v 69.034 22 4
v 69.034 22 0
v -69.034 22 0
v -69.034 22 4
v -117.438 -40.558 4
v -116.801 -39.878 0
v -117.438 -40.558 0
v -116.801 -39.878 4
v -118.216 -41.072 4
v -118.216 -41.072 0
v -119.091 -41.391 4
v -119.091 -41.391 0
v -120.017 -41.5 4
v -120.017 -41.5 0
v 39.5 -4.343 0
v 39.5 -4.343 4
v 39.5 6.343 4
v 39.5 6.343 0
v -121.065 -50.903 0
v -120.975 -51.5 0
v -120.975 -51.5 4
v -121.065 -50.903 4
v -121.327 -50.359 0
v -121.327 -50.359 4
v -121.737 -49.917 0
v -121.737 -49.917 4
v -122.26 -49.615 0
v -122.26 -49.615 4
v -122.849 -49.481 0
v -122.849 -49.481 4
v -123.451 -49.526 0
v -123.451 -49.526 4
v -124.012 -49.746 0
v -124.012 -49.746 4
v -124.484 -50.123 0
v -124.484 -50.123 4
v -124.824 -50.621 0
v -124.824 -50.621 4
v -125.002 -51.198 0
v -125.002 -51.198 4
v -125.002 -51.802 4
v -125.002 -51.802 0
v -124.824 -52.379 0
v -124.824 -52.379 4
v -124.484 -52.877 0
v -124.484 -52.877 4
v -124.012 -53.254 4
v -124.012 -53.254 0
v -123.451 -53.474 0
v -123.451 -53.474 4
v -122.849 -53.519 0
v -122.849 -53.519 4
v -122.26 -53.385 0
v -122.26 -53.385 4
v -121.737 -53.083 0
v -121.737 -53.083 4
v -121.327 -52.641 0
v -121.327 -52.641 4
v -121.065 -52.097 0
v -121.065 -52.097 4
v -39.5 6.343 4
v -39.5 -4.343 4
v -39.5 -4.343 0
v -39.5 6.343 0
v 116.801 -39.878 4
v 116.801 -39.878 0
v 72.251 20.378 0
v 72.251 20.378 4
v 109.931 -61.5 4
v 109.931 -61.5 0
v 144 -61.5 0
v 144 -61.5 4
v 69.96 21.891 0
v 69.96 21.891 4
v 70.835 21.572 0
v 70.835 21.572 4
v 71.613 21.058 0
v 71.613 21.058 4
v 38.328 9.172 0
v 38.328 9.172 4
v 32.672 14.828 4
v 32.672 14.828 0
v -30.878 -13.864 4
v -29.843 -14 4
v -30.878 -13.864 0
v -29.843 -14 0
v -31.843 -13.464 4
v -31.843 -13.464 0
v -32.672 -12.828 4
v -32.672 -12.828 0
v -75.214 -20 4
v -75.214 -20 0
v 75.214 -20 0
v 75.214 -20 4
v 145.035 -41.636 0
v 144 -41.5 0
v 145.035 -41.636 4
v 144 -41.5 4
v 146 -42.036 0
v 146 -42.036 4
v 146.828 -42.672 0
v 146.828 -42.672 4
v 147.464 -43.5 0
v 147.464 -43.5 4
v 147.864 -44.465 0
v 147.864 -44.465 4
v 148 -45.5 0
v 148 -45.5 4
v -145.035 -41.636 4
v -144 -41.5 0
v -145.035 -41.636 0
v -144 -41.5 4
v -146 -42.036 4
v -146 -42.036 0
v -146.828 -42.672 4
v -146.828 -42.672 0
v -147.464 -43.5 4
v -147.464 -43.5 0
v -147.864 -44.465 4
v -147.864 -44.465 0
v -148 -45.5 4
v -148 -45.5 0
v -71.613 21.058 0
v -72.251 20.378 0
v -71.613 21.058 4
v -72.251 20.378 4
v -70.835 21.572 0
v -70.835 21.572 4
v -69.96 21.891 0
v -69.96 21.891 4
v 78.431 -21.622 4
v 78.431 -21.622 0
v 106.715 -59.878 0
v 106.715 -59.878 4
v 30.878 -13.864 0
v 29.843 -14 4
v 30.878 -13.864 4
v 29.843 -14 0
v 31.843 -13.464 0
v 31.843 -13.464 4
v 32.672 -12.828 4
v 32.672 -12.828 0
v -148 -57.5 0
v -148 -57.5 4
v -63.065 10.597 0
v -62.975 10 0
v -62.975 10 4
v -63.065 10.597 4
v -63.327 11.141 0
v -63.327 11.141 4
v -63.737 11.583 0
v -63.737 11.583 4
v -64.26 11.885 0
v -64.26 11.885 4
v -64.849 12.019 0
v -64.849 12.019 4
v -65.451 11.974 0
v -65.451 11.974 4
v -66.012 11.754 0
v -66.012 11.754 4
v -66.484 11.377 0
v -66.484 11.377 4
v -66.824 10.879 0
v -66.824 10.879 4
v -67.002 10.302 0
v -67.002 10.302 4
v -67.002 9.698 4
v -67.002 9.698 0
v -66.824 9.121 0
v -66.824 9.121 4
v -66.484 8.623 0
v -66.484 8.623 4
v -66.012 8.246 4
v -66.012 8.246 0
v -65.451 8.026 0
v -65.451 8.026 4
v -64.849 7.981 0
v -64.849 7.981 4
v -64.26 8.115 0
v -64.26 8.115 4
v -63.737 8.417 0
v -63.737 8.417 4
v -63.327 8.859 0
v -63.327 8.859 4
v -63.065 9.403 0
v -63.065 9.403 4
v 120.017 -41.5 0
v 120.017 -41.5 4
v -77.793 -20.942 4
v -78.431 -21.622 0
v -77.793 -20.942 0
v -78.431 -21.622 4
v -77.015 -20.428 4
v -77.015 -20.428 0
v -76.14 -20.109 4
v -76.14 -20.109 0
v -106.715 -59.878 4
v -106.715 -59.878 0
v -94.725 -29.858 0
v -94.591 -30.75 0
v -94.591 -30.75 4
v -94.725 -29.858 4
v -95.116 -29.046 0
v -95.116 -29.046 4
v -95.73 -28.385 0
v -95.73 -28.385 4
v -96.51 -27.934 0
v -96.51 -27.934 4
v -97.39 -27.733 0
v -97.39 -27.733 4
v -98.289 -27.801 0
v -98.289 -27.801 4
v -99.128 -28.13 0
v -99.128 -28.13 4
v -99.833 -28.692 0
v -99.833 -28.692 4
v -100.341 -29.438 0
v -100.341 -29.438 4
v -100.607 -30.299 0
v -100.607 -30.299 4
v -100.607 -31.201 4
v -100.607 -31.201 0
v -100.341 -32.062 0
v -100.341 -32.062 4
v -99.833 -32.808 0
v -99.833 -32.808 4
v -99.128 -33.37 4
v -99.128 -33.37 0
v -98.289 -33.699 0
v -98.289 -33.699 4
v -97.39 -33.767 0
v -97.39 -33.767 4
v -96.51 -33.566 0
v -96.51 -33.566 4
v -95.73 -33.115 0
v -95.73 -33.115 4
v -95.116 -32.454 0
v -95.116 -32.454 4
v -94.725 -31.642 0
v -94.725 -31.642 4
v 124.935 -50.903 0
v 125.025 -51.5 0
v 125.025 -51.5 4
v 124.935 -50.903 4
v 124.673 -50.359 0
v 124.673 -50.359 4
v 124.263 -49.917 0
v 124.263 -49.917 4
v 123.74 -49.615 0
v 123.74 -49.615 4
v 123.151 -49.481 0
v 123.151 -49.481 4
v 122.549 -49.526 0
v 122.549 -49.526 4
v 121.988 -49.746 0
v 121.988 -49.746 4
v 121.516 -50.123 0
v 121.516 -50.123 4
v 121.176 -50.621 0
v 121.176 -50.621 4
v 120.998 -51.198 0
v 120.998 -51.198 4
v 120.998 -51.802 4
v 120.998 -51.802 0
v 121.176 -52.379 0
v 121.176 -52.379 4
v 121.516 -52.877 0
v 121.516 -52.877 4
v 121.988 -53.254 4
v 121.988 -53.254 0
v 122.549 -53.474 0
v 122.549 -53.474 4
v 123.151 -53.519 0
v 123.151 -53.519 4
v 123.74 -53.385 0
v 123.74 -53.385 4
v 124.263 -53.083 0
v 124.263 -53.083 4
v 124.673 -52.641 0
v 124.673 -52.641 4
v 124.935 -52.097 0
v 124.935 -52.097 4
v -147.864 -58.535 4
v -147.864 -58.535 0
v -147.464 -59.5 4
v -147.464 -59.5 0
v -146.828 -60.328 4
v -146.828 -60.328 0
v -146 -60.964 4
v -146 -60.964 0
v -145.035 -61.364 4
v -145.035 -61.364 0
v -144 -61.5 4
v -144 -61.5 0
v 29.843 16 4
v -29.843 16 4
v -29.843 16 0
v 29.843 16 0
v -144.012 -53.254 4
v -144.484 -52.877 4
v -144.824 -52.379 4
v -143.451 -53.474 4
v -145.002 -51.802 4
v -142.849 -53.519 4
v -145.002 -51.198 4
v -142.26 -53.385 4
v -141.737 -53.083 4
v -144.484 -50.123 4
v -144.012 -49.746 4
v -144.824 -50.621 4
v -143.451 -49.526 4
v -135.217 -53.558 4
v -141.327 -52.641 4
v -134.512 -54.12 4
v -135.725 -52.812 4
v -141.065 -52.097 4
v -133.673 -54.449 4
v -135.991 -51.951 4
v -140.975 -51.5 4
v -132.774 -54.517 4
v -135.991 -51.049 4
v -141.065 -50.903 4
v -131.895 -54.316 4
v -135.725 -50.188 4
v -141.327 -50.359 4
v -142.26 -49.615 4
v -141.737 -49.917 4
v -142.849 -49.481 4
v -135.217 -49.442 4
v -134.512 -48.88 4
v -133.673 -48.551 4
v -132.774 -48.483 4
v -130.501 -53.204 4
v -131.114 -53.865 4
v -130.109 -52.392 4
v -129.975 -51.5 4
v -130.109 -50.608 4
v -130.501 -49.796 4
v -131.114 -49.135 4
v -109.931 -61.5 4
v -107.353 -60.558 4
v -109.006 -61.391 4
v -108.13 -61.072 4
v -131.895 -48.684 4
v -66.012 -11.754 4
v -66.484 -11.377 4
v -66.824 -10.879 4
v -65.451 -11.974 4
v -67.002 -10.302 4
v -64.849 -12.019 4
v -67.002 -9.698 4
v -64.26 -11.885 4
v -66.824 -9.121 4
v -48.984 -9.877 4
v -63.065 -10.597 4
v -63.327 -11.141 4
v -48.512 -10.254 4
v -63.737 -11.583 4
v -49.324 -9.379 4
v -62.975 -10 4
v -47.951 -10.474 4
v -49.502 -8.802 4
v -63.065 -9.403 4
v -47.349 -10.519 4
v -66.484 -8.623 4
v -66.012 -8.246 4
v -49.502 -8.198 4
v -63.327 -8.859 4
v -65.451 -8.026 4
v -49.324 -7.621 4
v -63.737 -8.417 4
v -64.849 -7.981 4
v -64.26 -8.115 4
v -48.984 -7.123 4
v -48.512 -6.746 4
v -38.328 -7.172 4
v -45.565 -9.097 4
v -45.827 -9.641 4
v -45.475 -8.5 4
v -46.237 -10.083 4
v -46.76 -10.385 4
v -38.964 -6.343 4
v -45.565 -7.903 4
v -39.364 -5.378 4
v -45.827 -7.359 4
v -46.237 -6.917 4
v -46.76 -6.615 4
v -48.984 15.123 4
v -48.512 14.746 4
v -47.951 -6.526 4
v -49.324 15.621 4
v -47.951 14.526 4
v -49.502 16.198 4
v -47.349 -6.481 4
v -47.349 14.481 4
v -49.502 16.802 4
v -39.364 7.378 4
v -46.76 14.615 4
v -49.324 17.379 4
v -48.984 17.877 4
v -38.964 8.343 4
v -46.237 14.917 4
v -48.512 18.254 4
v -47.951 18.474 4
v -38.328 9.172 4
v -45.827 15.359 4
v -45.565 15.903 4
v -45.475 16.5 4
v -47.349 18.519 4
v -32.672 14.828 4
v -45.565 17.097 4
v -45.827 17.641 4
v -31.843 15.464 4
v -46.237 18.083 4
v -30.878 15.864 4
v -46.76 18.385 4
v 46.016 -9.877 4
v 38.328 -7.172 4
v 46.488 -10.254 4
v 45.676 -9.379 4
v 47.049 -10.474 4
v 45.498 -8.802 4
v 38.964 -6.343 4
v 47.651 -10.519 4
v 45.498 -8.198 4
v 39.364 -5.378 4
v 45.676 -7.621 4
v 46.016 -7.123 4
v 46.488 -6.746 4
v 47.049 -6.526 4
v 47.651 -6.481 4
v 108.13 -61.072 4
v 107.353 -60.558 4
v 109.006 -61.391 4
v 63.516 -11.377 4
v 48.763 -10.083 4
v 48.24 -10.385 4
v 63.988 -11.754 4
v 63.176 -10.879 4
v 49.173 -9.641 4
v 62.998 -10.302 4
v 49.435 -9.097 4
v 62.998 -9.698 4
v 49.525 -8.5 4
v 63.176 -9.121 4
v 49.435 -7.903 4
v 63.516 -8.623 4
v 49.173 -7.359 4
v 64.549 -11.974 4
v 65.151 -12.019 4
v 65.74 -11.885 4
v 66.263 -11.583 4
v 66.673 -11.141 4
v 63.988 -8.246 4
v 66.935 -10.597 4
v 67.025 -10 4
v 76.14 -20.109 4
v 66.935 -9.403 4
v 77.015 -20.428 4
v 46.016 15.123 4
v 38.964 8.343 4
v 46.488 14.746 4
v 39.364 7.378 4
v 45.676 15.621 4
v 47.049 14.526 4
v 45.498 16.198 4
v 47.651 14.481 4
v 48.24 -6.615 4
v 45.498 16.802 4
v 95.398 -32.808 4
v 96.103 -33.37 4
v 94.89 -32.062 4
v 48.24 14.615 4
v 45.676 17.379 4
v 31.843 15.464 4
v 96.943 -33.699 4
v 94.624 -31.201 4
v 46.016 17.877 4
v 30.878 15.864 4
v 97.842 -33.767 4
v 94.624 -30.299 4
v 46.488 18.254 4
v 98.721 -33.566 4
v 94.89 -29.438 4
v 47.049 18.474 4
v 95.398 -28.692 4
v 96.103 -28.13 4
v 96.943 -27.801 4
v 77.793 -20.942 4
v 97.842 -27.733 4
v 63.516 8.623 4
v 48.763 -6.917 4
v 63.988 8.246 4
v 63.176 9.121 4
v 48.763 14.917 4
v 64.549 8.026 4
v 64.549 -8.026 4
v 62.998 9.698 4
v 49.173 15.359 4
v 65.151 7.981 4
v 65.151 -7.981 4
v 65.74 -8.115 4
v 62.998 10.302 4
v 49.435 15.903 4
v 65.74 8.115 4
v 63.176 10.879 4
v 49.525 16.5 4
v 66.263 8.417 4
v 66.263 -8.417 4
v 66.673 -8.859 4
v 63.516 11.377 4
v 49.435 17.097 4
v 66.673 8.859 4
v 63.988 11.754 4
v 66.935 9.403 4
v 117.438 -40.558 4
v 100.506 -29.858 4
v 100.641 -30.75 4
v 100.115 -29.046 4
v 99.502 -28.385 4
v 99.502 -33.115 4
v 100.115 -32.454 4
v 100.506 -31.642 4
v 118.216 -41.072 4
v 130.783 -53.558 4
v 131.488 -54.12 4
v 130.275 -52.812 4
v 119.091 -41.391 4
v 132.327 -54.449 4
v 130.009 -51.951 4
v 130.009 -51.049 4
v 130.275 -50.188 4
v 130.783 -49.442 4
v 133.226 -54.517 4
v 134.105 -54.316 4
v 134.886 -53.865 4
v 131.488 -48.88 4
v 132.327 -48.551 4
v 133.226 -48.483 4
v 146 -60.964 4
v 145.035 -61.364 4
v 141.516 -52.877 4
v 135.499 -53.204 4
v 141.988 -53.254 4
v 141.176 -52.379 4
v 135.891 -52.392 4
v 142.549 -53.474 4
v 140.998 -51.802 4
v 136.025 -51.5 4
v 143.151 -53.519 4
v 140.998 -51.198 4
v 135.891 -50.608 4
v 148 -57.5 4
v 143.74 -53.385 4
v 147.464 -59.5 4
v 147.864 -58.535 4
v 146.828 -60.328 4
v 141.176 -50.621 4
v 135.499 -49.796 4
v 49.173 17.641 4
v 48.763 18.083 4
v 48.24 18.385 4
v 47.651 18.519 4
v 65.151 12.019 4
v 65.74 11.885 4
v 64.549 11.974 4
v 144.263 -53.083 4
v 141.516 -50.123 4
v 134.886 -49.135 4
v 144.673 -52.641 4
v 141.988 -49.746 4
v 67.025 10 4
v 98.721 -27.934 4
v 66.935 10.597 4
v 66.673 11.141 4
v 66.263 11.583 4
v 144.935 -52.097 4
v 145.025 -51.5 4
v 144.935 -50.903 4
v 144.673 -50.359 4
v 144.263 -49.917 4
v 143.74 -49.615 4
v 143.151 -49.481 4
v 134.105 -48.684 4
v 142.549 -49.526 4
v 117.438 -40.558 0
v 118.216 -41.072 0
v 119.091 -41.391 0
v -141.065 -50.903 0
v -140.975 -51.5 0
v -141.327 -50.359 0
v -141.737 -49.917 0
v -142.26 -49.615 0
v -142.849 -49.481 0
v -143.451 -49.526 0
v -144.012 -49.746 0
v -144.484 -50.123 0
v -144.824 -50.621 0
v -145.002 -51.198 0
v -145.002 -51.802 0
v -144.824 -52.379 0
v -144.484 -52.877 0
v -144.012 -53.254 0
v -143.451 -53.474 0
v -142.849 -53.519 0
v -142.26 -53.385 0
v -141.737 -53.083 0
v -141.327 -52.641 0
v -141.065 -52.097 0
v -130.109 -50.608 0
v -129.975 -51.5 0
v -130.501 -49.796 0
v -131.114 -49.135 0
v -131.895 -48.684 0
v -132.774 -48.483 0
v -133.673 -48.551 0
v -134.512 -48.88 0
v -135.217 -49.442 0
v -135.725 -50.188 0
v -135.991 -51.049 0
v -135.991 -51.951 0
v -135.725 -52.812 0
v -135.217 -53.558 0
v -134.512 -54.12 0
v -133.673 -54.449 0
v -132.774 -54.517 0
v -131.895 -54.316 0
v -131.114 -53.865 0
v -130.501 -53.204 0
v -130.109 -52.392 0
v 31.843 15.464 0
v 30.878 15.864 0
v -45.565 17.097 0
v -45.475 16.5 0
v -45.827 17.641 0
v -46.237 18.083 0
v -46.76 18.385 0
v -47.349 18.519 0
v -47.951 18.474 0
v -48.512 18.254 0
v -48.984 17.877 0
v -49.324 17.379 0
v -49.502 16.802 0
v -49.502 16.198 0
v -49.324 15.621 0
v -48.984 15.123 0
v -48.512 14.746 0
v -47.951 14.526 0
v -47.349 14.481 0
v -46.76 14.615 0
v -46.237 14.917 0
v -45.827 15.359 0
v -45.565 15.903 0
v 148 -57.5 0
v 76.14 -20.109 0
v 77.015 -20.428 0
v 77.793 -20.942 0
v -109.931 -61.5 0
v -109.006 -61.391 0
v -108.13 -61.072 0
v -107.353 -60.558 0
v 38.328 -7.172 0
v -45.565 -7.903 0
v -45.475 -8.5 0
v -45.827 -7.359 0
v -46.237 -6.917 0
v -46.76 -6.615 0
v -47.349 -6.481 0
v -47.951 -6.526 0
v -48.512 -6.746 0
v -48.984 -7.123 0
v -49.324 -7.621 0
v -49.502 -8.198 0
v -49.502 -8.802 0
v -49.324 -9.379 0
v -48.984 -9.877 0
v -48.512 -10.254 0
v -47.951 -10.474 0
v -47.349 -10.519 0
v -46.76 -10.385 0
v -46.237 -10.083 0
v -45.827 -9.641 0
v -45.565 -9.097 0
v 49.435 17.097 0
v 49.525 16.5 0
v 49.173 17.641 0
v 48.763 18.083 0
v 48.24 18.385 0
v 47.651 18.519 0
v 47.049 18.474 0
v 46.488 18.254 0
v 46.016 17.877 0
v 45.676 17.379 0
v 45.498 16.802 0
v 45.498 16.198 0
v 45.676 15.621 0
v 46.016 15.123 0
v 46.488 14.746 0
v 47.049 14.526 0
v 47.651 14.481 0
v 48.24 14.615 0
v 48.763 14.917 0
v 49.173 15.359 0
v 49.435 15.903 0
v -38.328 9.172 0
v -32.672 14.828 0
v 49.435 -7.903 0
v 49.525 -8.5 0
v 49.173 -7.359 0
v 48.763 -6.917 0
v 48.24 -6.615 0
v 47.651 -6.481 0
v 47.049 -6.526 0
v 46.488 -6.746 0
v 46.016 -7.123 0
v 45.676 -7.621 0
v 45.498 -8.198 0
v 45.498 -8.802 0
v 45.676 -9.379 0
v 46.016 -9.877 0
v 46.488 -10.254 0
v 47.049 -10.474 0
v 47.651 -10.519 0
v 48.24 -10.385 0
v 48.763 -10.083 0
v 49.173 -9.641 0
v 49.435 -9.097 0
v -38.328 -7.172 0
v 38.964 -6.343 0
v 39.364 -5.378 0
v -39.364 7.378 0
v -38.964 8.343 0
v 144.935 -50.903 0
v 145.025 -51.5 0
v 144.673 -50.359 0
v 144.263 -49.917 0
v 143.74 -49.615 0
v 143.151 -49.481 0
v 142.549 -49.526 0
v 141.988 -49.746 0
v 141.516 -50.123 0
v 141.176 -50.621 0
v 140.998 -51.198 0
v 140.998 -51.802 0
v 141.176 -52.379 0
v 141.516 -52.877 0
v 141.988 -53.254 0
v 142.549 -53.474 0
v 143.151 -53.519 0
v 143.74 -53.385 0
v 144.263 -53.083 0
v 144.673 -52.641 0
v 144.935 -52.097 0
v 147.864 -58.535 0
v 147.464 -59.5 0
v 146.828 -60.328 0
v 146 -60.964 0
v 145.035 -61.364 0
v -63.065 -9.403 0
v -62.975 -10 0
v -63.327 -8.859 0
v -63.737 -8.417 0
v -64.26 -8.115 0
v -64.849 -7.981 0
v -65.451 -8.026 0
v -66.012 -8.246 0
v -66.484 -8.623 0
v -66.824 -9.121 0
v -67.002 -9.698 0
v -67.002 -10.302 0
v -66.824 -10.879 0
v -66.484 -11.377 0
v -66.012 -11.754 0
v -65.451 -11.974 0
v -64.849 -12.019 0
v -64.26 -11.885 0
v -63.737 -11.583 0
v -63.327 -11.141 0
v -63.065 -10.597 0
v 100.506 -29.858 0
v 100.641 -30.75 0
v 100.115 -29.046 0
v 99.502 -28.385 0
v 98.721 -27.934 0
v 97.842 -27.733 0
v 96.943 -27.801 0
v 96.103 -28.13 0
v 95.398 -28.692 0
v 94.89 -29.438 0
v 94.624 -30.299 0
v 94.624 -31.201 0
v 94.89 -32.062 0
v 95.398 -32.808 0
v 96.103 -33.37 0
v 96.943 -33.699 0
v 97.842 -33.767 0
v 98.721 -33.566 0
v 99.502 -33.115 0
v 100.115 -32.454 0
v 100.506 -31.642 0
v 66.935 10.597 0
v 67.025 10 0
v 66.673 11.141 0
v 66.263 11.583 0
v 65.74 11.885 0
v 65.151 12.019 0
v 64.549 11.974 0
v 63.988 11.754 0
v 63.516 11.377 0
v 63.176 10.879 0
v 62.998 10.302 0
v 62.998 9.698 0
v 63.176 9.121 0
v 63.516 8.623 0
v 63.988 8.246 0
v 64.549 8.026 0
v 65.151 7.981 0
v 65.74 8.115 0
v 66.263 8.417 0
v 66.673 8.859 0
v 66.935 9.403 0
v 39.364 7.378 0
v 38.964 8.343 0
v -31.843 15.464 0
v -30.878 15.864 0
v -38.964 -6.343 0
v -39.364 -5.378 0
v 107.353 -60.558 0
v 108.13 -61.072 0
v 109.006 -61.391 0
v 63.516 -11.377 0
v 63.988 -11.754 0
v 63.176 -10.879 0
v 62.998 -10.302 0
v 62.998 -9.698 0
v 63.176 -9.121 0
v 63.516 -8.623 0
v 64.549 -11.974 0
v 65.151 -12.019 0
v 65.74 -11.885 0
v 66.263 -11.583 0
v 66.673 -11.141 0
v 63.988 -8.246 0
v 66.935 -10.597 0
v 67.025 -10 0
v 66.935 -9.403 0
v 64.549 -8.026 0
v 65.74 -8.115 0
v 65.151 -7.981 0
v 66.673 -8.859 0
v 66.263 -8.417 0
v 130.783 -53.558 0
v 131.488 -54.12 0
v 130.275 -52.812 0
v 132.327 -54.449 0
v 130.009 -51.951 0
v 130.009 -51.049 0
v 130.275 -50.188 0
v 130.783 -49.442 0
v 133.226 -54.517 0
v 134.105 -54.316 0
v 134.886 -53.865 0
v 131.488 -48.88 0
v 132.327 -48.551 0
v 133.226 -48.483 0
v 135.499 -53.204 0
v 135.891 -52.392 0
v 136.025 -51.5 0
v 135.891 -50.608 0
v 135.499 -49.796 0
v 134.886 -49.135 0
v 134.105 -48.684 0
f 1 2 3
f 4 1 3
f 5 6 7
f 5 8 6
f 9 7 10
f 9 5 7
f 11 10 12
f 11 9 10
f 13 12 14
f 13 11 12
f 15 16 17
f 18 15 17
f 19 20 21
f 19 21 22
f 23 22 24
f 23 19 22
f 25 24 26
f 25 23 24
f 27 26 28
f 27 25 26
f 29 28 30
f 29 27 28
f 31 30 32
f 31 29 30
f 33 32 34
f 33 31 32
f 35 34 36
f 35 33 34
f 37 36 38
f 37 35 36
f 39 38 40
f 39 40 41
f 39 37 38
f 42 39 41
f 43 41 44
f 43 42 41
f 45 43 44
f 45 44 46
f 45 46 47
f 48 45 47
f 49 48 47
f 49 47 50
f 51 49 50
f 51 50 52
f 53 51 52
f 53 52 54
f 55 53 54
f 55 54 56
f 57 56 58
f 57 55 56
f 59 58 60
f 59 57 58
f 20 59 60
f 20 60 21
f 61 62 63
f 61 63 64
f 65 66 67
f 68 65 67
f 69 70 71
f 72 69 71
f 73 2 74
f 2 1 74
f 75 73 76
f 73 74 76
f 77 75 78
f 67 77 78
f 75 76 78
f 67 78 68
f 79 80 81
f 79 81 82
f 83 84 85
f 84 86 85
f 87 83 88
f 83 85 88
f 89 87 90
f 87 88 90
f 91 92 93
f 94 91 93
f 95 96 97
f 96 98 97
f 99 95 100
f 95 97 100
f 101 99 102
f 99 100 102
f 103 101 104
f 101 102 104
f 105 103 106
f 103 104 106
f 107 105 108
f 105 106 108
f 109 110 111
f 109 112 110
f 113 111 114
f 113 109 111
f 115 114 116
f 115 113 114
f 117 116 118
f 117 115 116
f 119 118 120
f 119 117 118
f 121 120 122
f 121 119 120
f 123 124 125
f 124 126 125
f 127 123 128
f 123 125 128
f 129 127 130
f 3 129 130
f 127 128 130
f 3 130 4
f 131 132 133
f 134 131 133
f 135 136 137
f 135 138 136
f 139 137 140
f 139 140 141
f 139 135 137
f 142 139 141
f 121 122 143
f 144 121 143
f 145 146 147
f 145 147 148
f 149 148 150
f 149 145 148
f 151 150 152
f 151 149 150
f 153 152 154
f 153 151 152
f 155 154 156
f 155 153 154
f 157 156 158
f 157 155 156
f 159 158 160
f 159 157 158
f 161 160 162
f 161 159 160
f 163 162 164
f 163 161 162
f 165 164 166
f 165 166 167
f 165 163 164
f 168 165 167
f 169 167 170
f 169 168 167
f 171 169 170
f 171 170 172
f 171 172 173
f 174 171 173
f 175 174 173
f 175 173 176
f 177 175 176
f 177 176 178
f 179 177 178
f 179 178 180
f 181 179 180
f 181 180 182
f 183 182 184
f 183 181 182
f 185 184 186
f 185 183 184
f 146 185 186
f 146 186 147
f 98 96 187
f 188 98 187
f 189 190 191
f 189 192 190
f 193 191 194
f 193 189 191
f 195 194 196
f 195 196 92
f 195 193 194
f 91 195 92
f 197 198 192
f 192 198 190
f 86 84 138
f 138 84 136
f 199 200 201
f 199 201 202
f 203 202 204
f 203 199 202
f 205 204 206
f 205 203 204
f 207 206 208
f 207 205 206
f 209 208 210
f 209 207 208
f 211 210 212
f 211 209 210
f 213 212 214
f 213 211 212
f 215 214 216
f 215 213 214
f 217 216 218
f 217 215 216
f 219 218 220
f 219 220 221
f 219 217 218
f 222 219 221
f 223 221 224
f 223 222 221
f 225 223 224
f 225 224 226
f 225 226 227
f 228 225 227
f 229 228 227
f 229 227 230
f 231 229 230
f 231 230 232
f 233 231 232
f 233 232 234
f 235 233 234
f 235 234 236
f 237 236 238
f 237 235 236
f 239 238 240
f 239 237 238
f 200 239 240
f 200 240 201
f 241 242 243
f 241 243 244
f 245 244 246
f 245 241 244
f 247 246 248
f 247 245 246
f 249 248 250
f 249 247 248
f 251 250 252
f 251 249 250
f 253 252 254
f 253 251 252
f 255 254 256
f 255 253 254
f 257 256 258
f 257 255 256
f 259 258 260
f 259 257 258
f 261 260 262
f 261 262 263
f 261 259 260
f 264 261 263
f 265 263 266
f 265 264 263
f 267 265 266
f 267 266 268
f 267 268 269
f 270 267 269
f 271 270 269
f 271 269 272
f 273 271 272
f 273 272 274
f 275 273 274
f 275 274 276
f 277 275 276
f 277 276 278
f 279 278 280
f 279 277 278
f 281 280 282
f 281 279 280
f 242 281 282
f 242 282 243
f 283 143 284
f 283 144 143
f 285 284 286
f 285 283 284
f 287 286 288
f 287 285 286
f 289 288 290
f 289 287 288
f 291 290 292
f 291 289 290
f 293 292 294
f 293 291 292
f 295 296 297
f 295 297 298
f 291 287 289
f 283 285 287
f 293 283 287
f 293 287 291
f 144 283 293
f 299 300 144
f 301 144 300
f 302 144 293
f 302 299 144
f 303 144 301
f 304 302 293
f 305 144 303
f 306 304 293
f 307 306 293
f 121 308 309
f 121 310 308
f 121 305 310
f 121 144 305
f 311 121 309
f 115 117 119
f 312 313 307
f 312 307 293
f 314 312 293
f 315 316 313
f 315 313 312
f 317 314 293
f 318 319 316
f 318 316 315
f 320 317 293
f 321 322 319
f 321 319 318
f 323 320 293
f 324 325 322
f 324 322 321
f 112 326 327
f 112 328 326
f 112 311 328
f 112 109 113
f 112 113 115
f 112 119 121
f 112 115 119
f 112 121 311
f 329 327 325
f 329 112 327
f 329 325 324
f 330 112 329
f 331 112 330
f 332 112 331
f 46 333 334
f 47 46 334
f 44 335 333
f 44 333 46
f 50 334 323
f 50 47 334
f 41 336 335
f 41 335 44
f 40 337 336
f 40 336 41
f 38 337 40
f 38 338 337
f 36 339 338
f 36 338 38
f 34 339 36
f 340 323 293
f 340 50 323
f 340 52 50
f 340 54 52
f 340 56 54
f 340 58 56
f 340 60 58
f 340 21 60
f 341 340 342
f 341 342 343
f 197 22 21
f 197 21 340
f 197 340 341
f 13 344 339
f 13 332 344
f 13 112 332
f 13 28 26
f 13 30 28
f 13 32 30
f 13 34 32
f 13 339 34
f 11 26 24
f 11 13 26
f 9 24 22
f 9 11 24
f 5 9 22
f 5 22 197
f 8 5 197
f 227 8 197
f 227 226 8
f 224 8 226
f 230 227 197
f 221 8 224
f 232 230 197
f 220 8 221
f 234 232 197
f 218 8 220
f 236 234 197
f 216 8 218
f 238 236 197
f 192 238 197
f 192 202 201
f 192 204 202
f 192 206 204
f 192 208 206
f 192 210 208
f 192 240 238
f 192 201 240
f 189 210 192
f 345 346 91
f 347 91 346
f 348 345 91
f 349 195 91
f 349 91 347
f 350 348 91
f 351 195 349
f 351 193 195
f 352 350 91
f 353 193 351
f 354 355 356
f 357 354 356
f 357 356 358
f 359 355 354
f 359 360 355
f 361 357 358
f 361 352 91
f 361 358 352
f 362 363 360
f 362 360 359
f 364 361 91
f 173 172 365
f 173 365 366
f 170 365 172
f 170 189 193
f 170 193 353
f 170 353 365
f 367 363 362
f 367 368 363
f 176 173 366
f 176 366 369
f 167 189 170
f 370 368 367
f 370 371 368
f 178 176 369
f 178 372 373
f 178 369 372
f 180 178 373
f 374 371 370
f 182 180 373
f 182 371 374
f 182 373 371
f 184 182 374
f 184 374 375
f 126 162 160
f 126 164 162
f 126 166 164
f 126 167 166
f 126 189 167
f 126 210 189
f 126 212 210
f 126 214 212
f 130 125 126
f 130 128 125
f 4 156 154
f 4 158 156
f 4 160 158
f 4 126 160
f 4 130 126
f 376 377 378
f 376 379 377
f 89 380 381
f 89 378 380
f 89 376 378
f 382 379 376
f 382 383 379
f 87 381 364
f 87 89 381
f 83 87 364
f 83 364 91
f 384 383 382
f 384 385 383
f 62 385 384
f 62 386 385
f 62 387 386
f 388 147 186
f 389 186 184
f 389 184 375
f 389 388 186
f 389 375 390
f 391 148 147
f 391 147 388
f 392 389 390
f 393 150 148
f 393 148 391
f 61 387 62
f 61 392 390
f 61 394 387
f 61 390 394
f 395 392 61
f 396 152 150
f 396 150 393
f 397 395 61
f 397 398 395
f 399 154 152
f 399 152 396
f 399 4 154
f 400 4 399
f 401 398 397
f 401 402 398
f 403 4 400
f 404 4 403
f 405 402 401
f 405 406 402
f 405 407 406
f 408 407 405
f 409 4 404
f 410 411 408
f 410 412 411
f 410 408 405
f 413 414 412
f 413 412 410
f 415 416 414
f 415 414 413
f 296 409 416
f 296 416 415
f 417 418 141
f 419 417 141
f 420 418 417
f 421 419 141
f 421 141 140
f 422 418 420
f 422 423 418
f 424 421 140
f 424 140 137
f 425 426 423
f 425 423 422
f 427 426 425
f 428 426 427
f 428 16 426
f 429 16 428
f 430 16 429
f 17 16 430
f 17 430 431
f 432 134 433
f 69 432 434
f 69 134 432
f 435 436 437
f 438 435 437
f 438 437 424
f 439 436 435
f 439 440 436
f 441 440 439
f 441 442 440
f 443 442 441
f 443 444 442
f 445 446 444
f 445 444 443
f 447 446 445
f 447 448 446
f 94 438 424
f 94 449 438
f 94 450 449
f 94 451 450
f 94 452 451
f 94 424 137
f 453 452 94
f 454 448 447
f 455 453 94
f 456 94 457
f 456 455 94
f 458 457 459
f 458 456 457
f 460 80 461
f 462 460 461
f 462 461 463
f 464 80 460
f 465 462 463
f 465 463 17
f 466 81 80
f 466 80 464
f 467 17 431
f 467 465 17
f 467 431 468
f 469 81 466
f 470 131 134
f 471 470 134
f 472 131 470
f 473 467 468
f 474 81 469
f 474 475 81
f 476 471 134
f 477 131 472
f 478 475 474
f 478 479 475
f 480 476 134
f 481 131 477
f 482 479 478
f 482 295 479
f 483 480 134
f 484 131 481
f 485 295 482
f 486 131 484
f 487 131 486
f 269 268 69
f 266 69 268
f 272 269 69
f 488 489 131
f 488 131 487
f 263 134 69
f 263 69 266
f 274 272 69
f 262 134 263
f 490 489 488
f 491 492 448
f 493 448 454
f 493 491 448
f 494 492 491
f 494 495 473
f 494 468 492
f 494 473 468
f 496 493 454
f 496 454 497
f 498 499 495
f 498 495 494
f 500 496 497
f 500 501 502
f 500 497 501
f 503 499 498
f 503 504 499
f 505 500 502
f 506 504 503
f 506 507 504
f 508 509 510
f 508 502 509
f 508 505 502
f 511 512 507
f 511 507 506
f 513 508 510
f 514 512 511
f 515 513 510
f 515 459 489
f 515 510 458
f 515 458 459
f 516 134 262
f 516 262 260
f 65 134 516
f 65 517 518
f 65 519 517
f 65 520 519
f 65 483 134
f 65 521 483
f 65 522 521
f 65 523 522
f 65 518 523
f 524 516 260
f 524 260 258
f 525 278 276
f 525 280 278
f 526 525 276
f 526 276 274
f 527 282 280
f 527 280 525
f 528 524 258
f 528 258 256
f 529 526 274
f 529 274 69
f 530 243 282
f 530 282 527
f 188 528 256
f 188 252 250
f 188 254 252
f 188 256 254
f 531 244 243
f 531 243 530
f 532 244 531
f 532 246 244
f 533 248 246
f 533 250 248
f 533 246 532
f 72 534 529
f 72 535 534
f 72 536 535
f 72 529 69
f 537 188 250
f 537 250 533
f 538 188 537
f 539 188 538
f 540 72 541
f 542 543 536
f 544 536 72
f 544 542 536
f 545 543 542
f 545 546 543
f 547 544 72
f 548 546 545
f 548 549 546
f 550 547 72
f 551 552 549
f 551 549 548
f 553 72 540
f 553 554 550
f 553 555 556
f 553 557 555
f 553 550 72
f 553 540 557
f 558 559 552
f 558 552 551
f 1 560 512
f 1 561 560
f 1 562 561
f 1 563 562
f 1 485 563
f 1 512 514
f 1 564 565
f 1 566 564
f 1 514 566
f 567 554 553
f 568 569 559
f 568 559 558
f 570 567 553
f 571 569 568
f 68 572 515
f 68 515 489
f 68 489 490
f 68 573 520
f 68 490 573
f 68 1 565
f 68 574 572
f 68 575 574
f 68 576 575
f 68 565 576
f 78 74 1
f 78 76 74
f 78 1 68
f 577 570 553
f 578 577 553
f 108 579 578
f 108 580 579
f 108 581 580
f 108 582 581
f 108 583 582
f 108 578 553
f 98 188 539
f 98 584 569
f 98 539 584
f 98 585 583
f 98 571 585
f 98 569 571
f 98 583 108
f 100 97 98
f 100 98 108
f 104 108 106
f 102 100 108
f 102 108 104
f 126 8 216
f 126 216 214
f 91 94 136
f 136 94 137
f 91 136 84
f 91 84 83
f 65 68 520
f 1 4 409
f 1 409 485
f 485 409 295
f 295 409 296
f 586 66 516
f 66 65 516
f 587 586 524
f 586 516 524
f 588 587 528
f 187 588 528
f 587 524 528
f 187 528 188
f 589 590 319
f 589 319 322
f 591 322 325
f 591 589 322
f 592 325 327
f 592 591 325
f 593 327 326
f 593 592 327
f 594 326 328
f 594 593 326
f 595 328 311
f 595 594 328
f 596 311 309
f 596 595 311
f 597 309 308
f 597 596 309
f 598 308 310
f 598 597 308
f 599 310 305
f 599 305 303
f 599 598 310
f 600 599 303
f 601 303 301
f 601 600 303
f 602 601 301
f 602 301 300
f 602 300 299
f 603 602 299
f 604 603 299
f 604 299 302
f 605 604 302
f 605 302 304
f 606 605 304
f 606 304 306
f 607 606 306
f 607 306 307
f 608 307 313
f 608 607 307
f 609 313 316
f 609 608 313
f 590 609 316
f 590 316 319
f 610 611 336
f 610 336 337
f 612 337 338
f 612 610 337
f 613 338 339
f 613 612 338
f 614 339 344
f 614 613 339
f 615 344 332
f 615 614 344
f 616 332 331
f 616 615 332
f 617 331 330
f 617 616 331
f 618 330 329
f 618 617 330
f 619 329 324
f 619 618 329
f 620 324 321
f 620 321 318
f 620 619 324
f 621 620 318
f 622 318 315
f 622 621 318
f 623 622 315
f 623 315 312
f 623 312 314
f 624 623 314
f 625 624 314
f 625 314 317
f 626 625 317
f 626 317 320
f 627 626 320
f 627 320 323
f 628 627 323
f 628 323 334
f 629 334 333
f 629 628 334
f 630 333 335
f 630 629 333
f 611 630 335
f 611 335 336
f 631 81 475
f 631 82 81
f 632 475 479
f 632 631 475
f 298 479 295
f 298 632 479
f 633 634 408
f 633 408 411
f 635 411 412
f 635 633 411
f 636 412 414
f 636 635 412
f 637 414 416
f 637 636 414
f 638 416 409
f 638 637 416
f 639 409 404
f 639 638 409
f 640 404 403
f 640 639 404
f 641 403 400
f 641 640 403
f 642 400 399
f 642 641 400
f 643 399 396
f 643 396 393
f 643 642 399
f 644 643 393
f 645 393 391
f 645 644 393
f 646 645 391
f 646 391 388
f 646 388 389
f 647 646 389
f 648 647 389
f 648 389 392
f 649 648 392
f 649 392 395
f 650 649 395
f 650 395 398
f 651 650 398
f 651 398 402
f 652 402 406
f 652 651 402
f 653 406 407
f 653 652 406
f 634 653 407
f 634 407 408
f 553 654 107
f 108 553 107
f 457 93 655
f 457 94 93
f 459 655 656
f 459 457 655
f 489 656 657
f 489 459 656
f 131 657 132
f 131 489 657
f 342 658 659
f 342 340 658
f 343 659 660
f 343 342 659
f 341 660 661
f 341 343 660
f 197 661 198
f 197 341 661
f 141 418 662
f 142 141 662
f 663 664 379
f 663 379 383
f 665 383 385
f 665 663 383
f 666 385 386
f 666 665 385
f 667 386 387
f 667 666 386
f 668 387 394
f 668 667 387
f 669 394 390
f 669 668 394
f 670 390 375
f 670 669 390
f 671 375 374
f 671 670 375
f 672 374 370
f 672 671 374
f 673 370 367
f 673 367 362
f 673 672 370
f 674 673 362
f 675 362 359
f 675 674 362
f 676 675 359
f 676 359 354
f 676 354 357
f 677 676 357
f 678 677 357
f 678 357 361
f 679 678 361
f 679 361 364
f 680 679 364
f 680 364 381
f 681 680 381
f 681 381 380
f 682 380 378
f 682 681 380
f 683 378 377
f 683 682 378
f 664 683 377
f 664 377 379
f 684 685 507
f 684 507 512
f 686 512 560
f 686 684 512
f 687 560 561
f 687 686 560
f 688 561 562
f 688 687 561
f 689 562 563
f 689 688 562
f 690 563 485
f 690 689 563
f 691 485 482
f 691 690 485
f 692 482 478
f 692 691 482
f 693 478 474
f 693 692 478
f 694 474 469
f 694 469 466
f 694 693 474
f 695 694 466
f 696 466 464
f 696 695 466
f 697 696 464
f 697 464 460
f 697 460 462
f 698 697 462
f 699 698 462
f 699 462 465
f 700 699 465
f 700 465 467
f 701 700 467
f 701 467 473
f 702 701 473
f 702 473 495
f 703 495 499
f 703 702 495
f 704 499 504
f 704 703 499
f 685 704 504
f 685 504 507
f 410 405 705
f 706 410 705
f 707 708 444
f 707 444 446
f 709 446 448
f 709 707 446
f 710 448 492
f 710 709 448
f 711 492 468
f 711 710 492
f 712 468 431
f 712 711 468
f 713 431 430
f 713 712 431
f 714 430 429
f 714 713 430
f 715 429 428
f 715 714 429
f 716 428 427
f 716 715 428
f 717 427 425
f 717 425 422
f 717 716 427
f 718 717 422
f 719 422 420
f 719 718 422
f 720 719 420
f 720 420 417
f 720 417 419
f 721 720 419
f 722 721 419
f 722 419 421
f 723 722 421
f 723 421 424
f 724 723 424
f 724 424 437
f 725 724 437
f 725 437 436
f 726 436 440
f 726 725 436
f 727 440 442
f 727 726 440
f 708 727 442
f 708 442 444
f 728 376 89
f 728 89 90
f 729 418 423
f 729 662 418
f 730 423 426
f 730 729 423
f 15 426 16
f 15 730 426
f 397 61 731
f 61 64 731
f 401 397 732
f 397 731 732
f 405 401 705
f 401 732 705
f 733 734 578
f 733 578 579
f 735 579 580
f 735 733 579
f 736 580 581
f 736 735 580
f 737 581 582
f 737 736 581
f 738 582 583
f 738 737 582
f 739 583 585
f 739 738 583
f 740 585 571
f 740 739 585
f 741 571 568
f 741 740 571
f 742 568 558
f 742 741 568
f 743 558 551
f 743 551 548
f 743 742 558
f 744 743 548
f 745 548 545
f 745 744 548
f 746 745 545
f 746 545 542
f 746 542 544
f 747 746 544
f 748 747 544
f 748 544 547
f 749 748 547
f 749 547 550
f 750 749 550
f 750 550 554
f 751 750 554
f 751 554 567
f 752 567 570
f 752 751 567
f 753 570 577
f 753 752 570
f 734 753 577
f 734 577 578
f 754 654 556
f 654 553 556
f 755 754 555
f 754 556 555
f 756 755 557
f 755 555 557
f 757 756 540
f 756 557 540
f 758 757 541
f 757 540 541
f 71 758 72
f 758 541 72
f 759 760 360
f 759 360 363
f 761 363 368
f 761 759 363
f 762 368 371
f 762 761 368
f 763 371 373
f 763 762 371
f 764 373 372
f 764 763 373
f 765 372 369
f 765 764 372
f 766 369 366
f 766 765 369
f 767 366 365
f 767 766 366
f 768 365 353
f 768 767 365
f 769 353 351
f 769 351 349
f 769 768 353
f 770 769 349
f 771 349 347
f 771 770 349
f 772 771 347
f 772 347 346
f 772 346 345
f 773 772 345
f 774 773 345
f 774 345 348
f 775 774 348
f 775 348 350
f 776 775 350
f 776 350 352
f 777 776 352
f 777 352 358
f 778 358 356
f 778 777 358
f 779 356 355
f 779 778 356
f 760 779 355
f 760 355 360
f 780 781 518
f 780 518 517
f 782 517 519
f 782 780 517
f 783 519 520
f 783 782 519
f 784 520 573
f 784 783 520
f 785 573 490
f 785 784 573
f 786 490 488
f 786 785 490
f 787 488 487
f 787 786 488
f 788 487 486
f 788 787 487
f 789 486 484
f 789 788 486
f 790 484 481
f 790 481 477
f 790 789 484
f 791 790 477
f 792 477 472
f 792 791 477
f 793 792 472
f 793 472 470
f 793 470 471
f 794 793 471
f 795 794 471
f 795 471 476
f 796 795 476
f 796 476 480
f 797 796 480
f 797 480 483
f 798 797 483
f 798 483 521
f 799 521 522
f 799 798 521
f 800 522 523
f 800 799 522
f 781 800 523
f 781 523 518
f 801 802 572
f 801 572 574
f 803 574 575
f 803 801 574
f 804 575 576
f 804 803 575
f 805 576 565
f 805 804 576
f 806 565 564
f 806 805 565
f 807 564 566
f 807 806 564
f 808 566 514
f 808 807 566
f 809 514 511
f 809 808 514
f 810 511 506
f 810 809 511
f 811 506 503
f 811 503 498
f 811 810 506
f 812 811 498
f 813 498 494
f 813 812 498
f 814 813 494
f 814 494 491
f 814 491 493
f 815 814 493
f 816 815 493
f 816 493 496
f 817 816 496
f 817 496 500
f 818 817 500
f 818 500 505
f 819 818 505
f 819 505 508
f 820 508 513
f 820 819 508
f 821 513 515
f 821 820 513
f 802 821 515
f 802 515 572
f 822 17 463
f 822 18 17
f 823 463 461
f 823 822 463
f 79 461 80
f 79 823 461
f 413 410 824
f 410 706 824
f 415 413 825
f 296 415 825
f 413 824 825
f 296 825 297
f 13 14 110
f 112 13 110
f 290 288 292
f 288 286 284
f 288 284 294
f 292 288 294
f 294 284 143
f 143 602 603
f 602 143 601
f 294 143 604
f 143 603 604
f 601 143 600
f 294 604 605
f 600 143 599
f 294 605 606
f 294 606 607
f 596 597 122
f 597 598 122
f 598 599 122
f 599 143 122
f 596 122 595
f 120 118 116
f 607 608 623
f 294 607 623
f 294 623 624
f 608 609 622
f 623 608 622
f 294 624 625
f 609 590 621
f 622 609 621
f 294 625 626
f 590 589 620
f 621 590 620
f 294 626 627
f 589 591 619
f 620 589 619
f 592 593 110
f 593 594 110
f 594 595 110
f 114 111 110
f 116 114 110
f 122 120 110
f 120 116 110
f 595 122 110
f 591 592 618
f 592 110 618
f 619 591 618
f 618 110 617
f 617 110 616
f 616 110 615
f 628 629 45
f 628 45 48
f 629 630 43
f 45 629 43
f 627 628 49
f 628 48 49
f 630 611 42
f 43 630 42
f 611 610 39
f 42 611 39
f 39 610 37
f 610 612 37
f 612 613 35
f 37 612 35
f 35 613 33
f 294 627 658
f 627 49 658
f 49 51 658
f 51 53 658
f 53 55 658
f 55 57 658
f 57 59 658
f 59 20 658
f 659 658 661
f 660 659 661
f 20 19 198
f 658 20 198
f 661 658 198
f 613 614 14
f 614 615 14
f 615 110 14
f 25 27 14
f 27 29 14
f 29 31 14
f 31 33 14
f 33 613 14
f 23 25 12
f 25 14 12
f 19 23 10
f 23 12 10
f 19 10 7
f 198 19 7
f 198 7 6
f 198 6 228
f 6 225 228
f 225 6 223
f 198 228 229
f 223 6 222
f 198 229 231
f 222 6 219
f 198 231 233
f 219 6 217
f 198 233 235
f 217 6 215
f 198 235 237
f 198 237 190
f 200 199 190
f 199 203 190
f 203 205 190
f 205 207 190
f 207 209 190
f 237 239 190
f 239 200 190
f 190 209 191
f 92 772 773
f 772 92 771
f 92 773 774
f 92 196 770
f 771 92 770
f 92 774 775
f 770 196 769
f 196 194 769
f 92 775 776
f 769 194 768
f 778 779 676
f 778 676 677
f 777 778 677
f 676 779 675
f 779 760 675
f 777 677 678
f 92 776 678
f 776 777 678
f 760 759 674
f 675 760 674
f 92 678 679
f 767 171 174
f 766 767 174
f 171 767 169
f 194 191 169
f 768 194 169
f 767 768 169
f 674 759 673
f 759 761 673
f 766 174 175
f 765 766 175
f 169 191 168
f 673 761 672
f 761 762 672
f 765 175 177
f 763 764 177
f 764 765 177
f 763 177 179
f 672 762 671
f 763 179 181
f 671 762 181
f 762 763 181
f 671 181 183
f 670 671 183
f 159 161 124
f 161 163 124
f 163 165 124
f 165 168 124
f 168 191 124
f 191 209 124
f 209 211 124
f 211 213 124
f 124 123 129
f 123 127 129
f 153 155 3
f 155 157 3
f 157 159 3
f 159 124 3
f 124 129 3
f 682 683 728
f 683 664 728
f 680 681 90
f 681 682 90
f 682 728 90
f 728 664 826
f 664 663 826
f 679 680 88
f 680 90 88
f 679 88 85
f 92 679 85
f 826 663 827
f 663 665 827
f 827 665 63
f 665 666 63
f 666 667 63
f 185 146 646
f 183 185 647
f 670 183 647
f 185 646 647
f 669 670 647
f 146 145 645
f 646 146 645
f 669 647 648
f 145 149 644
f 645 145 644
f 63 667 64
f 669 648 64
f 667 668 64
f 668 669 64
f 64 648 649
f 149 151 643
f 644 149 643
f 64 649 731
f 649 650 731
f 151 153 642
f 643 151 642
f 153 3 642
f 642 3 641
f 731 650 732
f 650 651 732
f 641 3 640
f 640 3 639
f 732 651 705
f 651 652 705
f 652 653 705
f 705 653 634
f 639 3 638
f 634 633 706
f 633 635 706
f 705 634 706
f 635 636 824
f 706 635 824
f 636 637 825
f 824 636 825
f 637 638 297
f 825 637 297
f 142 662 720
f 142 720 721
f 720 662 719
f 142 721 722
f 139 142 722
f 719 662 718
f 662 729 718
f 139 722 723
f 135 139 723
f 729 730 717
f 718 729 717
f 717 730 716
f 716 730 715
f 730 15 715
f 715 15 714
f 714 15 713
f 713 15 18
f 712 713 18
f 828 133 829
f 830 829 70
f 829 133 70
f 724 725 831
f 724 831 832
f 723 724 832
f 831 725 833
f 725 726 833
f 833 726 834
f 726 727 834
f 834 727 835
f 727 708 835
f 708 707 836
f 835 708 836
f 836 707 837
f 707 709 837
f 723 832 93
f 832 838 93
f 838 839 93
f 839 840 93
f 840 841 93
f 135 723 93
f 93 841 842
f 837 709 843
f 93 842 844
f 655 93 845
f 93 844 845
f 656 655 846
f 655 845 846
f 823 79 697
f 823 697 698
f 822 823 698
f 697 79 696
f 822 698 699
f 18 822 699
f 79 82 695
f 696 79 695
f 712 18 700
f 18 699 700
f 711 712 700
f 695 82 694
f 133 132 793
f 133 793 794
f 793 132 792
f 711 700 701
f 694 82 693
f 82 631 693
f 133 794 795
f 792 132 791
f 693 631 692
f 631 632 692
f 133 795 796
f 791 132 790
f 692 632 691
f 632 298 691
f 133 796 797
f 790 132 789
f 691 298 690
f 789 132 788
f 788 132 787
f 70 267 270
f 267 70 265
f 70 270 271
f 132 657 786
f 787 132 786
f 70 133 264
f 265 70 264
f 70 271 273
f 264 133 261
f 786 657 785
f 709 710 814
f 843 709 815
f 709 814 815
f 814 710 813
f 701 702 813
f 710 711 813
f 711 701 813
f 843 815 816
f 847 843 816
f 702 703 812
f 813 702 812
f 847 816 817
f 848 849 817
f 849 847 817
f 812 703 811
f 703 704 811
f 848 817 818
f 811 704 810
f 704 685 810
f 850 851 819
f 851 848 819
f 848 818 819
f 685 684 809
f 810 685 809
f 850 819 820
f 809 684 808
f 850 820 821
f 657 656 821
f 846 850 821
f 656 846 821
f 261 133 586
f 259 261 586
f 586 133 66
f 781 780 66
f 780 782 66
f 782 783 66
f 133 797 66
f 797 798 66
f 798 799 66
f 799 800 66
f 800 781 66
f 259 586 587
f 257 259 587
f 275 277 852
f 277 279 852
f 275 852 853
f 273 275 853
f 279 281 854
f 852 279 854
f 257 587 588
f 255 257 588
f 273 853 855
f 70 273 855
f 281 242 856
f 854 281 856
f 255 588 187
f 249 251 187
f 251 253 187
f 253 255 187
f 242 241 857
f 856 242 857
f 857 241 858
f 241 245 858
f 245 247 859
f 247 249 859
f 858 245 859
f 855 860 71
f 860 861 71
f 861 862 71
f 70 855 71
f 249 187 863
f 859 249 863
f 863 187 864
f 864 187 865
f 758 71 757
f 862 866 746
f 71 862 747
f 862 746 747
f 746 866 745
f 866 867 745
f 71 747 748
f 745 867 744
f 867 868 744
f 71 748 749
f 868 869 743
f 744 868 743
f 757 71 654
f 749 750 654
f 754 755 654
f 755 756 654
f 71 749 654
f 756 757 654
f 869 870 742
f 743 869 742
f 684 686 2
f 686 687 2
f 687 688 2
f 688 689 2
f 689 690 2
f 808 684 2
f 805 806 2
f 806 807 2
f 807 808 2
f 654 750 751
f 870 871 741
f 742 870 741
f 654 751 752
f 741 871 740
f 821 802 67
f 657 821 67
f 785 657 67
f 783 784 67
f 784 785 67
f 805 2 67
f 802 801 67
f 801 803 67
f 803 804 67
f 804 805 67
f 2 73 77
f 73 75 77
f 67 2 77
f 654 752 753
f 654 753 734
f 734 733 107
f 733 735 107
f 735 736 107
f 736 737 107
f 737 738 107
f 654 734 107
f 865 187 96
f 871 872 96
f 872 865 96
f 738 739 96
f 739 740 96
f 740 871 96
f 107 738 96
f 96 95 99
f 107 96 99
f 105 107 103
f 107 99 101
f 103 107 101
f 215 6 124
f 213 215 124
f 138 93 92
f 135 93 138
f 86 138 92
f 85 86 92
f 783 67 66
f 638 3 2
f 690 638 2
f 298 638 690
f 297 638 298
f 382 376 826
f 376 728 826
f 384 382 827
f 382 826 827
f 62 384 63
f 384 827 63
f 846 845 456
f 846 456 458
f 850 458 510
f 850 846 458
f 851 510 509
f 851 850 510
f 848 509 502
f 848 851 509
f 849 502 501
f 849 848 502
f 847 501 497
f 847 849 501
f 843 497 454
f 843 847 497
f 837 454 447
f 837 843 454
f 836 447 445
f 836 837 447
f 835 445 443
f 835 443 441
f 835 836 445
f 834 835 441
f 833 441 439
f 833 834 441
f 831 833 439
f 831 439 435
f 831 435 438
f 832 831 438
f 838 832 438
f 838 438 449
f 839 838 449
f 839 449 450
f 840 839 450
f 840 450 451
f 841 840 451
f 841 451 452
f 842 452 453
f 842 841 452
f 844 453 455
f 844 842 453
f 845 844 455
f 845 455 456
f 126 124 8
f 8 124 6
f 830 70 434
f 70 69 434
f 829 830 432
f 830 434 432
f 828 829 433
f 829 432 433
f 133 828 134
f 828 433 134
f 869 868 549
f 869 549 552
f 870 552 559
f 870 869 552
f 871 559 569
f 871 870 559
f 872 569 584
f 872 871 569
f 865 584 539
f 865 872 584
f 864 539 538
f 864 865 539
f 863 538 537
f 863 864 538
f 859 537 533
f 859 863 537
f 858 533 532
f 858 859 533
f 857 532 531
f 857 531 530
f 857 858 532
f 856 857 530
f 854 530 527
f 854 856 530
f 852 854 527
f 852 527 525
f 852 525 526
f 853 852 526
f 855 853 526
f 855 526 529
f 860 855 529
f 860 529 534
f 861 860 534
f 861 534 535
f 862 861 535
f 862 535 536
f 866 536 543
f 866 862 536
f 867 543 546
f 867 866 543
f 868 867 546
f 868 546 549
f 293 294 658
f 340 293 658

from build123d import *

# Parameters (mm, degrees)
SKETCH_1_R          = 3.025
SKETCH_1_R_2        = 2.025
EXTRUDE_1_DEPTH     = 4
SKETCH_2_W          = 79
SKETCH_2_H          = 30
CUT_EXTRUDE_1_DEPTH = 4
FILLET_1_R          = 4
CHAMFER_1_SIZE      = 8
FILLET_2_R          = 4


with BuildPart() as part:
    # 草图1 → 凸台-拉伸1 (new body)
    with BuildSketch(Plane.XY):
        Polygon((-71.051486421, 22), (-118, -41.5), (-148, -41.5), (-148, -61.5), (-107.914189298, -61.5), (-77.231302471, -20), (77.231302471, -20), (107.914189298, -61.5), (148, -61.5), (148, -41.5), (118, -41.5), (71.051486421, 22), align=None)
        with Locations((-97.615651235, -30.75)):
            Circle(SKETCH_1_R, mode=Mode.SUBTRACT)
        with Locations((97.615651235, -30.75)):
            Circle(SKETCH_1_R, mode=Mode.SUBTRACT)
        with Locations((-65, -10)):
            Circle(SKETCH_1_R_2, mode=Mode.SUBTRACT)
        with Locations((-47.5, -8.5)):
            Circle(SKETCH_1_R_2, mode=Mode.SUBTRACT)
        with Locations((-65, 10)):
            Circle(SKETCH_1_R_2, mode=Mode.SUBTRACT)
        with Locations((-47.5, 16.5)):
            Circle(SKETCH_1_R_2, mode=Mode.SUBTRACT)
        with Locations((65, -10)):
            Circle(SKETCH_1_R_2, mode=Mode.SUBTRACT)
        with Locations((47.5, -8.5)):
            Circle(SKETCH_1_R_2, mode=Mode.SUBTRACT)
        with Locations((65, 10)):
            Circle(SKETCH_1_R_2, mode=Mode.SUBTRACT)
        with Locations((47.5, 16.5)):
            Circle(SKETCH_1_R_2, mode=Mode.SUBTRACT)
        with Locations((-123, -51.5)):
            Circle(SKETCH_1_R_2, mode=Mode.SUBTRACT)
        with Locations((-143, -51.5)):
            Circle(SKETCH_1_R_2, mode=Mode.SUBTRACT)
        with Locations((-133, -51.5)):
            Circle(SKETCH_1_R, mode=Mode.SUBTRACT)
        with Locations((143, -51.5)):
            Circle(SKETCH_1_R_2, mode=Mode.SUBTRACT)
        with Locations((123, -51.5)):
            Circle(SKETCH_1_R_2, mode=Mode.SUBTRACT)
        with Locations((133, -51.5)):
            Circle(SKETCH_1_R, mode=Mode.SUBTRACT)
    extrude(amount=EXTRUDE_1_DEPTH)

    # 草图2 → 切除-拉伸1 (cut)
    with BuildSketch(Plane.XY.offset(4)):
        with Locations((0, 1)):
            Rectangle(SKETCH_2_W, SKETCH_2_H)
    extrude(amount=-CUT_EXTRUDE_1_DEPTH, mode=Mode.SUBTRACT)

    # 圆角1
    fillet_1_edges = [part.edges().sort_by_distance(p)[0] for p in [
        (-148, -61.5, 2),
        (-148, -41.5, 2),
        (-118, -41.5, 2),
        (-71.051486421, 22, 2),
        (71.051486421, 22, 2),
        (118, -41.5, 2),
        (148, -41.5, 2),
        (148, -61.5, 2),
        (107.914189298, -61.5, 2),
        (77.231302471, -20, 2),
        (-77.231302471, -20, 2),
        (-107.914189298, -61.5, 2),
    ]]
    fillet(fillet_1_edges, radius=FILLET_1_R)

    # 倒角1
    chamfer_1_edges = [part.edges().sort_by_distance(p)[0] for p in [
        (39.5, 16, 2),
        (39.5, -14, 2),
        (-39.5, -14, 2),
        (-39.5, 16, 2),
    ]]
    chamfer(chamfer_1_edges, length=CHAMFER_1_SIZE)

    # 圆角2
    fillet_2_edges = [part.edges().sort_by_distance(p)[0] for p in [
        (39.5, 8, 2),
        (39.5, -6, 2),
        (-31.5, -14, 2),
        (31.5, -14, 2),
        (-31.5, 16, 2),
        (31.5, 16, 2),
        (-39.5, -6, 2),
        (-39.5, 8, 2),
    ]]
    fillet(fillet_2_edges, radius=FILLET_2_R)


solid = part.part
